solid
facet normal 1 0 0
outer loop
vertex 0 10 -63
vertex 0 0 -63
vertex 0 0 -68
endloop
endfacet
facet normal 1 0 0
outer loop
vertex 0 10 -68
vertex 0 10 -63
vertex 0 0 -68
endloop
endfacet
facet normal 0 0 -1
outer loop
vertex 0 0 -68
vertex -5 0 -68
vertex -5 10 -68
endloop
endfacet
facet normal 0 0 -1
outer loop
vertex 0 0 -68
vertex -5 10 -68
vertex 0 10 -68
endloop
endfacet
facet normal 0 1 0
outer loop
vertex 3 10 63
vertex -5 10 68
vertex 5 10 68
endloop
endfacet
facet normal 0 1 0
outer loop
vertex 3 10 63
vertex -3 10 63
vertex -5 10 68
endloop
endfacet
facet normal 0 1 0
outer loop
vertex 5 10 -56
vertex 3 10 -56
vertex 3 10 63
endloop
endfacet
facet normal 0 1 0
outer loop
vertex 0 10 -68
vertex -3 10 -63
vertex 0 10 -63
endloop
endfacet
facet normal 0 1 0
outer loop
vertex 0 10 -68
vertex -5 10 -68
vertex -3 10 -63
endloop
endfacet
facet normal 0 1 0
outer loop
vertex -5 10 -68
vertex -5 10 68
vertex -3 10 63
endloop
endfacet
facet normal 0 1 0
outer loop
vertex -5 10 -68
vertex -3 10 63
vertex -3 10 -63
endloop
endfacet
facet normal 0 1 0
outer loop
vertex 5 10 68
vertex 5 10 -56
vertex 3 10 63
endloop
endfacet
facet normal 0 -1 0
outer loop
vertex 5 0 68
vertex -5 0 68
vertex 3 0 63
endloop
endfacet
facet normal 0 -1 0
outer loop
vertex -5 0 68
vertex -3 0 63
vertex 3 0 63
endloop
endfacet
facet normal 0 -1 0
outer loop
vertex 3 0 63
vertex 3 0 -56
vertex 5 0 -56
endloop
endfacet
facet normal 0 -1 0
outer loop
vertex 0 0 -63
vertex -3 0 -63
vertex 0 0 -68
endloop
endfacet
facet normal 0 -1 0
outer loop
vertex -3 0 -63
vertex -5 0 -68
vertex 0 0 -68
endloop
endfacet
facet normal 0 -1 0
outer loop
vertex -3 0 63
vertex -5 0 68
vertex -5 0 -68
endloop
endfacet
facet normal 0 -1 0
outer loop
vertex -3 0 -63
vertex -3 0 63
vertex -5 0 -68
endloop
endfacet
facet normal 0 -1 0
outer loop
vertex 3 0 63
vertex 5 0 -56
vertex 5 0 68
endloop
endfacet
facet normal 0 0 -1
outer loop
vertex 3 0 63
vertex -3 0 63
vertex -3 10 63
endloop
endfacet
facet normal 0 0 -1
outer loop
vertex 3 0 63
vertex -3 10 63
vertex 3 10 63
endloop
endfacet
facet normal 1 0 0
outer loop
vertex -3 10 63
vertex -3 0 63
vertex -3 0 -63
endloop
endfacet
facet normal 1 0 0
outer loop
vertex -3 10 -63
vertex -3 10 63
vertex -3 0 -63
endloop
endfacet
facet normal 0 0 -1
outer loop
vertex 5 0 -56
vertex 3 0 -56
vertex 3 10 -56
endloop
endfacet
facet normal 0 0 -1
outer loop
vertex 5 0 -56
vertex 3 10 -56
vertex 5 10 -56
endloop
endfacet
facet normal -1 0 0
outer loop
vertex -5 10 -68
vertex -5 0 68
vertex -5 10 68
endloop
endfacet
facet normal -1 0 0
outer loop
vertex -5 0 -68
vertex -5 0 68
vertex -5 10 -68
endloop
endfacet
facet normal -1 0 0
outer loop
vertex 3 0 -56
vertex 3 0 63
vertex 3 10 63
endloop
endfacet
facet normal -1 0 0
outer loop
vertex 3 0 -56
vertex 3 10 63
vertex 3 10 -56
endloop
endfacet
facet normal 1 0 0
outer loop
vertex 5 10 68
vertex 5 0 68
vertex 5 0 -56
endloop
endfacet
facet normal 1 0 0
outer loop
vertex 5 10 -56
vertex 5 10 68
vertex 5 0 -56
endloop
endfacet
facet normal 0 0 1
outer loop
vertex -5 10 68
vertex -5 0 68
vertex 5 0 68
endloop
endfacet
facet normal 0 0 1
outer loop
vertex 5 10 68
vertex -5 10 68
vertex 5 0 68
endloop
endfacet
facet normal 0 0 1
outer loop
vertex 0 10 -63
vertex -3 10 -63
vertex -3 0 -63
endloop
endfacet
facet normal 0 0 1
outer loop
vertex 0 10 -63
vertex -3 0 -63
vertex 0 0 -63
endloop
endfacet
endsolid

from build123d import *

# Parameters (mm, degrees)
SKETCH1_W           = 10
SKETCH1_H           = 136
BOSS_EXTRUDE1_DEPTH = 10
CUT_EXTRUDE1_DEPTH  = 10
SKETCH4_W           = 2
SKETCH4_H           = 12
CUT_EXTRUDE3_DEPTH  = 10


with BuildPart() as part:
    # Sketch1 → Boss-Extrude1 (new body)
    with BuildSketch(Plane(origin=(0, 0, 0), x_dir=(1, 0, 0), z_dir=(0, 1, 0))):
        Rectangle(SKETCH1_W, SKETCH1_H)
    extrude(amount=BOSS_EXTRUDE1_DEPTH)

    # Sketch2 → Cut-Extrude1 (cut)
    with BuildSketch(Plane(origin=(0, 0, 0), x_dir=(1, 0, 0), z_dir=(0, 1, 0))):
        Polygon((0, -63), (-3, -63), (-3, 63), (0, 63), (0, 68), (3, 68), (3, 63), (3, -63), align=None)
    extrude(amount=CUT_EXTRUDE1_DEPTH, mode=Mode.SUBTRACT)

    # Sketch4 → Cut-Extrude3 (cut)
    with BuildSketch(Plane(origin=(0, 10, 0), x_dir=(1, 0, 0), z_dir=(0, 1, 0))):
        with Locations((4, 62)):
            Rectangle(SKETCH4_W, SKETCH4_H)
    extrude(amount=-CUT_EXTRUDE3_DEPTH, mode=Mode.SUBTRACT)


solid = part.part
